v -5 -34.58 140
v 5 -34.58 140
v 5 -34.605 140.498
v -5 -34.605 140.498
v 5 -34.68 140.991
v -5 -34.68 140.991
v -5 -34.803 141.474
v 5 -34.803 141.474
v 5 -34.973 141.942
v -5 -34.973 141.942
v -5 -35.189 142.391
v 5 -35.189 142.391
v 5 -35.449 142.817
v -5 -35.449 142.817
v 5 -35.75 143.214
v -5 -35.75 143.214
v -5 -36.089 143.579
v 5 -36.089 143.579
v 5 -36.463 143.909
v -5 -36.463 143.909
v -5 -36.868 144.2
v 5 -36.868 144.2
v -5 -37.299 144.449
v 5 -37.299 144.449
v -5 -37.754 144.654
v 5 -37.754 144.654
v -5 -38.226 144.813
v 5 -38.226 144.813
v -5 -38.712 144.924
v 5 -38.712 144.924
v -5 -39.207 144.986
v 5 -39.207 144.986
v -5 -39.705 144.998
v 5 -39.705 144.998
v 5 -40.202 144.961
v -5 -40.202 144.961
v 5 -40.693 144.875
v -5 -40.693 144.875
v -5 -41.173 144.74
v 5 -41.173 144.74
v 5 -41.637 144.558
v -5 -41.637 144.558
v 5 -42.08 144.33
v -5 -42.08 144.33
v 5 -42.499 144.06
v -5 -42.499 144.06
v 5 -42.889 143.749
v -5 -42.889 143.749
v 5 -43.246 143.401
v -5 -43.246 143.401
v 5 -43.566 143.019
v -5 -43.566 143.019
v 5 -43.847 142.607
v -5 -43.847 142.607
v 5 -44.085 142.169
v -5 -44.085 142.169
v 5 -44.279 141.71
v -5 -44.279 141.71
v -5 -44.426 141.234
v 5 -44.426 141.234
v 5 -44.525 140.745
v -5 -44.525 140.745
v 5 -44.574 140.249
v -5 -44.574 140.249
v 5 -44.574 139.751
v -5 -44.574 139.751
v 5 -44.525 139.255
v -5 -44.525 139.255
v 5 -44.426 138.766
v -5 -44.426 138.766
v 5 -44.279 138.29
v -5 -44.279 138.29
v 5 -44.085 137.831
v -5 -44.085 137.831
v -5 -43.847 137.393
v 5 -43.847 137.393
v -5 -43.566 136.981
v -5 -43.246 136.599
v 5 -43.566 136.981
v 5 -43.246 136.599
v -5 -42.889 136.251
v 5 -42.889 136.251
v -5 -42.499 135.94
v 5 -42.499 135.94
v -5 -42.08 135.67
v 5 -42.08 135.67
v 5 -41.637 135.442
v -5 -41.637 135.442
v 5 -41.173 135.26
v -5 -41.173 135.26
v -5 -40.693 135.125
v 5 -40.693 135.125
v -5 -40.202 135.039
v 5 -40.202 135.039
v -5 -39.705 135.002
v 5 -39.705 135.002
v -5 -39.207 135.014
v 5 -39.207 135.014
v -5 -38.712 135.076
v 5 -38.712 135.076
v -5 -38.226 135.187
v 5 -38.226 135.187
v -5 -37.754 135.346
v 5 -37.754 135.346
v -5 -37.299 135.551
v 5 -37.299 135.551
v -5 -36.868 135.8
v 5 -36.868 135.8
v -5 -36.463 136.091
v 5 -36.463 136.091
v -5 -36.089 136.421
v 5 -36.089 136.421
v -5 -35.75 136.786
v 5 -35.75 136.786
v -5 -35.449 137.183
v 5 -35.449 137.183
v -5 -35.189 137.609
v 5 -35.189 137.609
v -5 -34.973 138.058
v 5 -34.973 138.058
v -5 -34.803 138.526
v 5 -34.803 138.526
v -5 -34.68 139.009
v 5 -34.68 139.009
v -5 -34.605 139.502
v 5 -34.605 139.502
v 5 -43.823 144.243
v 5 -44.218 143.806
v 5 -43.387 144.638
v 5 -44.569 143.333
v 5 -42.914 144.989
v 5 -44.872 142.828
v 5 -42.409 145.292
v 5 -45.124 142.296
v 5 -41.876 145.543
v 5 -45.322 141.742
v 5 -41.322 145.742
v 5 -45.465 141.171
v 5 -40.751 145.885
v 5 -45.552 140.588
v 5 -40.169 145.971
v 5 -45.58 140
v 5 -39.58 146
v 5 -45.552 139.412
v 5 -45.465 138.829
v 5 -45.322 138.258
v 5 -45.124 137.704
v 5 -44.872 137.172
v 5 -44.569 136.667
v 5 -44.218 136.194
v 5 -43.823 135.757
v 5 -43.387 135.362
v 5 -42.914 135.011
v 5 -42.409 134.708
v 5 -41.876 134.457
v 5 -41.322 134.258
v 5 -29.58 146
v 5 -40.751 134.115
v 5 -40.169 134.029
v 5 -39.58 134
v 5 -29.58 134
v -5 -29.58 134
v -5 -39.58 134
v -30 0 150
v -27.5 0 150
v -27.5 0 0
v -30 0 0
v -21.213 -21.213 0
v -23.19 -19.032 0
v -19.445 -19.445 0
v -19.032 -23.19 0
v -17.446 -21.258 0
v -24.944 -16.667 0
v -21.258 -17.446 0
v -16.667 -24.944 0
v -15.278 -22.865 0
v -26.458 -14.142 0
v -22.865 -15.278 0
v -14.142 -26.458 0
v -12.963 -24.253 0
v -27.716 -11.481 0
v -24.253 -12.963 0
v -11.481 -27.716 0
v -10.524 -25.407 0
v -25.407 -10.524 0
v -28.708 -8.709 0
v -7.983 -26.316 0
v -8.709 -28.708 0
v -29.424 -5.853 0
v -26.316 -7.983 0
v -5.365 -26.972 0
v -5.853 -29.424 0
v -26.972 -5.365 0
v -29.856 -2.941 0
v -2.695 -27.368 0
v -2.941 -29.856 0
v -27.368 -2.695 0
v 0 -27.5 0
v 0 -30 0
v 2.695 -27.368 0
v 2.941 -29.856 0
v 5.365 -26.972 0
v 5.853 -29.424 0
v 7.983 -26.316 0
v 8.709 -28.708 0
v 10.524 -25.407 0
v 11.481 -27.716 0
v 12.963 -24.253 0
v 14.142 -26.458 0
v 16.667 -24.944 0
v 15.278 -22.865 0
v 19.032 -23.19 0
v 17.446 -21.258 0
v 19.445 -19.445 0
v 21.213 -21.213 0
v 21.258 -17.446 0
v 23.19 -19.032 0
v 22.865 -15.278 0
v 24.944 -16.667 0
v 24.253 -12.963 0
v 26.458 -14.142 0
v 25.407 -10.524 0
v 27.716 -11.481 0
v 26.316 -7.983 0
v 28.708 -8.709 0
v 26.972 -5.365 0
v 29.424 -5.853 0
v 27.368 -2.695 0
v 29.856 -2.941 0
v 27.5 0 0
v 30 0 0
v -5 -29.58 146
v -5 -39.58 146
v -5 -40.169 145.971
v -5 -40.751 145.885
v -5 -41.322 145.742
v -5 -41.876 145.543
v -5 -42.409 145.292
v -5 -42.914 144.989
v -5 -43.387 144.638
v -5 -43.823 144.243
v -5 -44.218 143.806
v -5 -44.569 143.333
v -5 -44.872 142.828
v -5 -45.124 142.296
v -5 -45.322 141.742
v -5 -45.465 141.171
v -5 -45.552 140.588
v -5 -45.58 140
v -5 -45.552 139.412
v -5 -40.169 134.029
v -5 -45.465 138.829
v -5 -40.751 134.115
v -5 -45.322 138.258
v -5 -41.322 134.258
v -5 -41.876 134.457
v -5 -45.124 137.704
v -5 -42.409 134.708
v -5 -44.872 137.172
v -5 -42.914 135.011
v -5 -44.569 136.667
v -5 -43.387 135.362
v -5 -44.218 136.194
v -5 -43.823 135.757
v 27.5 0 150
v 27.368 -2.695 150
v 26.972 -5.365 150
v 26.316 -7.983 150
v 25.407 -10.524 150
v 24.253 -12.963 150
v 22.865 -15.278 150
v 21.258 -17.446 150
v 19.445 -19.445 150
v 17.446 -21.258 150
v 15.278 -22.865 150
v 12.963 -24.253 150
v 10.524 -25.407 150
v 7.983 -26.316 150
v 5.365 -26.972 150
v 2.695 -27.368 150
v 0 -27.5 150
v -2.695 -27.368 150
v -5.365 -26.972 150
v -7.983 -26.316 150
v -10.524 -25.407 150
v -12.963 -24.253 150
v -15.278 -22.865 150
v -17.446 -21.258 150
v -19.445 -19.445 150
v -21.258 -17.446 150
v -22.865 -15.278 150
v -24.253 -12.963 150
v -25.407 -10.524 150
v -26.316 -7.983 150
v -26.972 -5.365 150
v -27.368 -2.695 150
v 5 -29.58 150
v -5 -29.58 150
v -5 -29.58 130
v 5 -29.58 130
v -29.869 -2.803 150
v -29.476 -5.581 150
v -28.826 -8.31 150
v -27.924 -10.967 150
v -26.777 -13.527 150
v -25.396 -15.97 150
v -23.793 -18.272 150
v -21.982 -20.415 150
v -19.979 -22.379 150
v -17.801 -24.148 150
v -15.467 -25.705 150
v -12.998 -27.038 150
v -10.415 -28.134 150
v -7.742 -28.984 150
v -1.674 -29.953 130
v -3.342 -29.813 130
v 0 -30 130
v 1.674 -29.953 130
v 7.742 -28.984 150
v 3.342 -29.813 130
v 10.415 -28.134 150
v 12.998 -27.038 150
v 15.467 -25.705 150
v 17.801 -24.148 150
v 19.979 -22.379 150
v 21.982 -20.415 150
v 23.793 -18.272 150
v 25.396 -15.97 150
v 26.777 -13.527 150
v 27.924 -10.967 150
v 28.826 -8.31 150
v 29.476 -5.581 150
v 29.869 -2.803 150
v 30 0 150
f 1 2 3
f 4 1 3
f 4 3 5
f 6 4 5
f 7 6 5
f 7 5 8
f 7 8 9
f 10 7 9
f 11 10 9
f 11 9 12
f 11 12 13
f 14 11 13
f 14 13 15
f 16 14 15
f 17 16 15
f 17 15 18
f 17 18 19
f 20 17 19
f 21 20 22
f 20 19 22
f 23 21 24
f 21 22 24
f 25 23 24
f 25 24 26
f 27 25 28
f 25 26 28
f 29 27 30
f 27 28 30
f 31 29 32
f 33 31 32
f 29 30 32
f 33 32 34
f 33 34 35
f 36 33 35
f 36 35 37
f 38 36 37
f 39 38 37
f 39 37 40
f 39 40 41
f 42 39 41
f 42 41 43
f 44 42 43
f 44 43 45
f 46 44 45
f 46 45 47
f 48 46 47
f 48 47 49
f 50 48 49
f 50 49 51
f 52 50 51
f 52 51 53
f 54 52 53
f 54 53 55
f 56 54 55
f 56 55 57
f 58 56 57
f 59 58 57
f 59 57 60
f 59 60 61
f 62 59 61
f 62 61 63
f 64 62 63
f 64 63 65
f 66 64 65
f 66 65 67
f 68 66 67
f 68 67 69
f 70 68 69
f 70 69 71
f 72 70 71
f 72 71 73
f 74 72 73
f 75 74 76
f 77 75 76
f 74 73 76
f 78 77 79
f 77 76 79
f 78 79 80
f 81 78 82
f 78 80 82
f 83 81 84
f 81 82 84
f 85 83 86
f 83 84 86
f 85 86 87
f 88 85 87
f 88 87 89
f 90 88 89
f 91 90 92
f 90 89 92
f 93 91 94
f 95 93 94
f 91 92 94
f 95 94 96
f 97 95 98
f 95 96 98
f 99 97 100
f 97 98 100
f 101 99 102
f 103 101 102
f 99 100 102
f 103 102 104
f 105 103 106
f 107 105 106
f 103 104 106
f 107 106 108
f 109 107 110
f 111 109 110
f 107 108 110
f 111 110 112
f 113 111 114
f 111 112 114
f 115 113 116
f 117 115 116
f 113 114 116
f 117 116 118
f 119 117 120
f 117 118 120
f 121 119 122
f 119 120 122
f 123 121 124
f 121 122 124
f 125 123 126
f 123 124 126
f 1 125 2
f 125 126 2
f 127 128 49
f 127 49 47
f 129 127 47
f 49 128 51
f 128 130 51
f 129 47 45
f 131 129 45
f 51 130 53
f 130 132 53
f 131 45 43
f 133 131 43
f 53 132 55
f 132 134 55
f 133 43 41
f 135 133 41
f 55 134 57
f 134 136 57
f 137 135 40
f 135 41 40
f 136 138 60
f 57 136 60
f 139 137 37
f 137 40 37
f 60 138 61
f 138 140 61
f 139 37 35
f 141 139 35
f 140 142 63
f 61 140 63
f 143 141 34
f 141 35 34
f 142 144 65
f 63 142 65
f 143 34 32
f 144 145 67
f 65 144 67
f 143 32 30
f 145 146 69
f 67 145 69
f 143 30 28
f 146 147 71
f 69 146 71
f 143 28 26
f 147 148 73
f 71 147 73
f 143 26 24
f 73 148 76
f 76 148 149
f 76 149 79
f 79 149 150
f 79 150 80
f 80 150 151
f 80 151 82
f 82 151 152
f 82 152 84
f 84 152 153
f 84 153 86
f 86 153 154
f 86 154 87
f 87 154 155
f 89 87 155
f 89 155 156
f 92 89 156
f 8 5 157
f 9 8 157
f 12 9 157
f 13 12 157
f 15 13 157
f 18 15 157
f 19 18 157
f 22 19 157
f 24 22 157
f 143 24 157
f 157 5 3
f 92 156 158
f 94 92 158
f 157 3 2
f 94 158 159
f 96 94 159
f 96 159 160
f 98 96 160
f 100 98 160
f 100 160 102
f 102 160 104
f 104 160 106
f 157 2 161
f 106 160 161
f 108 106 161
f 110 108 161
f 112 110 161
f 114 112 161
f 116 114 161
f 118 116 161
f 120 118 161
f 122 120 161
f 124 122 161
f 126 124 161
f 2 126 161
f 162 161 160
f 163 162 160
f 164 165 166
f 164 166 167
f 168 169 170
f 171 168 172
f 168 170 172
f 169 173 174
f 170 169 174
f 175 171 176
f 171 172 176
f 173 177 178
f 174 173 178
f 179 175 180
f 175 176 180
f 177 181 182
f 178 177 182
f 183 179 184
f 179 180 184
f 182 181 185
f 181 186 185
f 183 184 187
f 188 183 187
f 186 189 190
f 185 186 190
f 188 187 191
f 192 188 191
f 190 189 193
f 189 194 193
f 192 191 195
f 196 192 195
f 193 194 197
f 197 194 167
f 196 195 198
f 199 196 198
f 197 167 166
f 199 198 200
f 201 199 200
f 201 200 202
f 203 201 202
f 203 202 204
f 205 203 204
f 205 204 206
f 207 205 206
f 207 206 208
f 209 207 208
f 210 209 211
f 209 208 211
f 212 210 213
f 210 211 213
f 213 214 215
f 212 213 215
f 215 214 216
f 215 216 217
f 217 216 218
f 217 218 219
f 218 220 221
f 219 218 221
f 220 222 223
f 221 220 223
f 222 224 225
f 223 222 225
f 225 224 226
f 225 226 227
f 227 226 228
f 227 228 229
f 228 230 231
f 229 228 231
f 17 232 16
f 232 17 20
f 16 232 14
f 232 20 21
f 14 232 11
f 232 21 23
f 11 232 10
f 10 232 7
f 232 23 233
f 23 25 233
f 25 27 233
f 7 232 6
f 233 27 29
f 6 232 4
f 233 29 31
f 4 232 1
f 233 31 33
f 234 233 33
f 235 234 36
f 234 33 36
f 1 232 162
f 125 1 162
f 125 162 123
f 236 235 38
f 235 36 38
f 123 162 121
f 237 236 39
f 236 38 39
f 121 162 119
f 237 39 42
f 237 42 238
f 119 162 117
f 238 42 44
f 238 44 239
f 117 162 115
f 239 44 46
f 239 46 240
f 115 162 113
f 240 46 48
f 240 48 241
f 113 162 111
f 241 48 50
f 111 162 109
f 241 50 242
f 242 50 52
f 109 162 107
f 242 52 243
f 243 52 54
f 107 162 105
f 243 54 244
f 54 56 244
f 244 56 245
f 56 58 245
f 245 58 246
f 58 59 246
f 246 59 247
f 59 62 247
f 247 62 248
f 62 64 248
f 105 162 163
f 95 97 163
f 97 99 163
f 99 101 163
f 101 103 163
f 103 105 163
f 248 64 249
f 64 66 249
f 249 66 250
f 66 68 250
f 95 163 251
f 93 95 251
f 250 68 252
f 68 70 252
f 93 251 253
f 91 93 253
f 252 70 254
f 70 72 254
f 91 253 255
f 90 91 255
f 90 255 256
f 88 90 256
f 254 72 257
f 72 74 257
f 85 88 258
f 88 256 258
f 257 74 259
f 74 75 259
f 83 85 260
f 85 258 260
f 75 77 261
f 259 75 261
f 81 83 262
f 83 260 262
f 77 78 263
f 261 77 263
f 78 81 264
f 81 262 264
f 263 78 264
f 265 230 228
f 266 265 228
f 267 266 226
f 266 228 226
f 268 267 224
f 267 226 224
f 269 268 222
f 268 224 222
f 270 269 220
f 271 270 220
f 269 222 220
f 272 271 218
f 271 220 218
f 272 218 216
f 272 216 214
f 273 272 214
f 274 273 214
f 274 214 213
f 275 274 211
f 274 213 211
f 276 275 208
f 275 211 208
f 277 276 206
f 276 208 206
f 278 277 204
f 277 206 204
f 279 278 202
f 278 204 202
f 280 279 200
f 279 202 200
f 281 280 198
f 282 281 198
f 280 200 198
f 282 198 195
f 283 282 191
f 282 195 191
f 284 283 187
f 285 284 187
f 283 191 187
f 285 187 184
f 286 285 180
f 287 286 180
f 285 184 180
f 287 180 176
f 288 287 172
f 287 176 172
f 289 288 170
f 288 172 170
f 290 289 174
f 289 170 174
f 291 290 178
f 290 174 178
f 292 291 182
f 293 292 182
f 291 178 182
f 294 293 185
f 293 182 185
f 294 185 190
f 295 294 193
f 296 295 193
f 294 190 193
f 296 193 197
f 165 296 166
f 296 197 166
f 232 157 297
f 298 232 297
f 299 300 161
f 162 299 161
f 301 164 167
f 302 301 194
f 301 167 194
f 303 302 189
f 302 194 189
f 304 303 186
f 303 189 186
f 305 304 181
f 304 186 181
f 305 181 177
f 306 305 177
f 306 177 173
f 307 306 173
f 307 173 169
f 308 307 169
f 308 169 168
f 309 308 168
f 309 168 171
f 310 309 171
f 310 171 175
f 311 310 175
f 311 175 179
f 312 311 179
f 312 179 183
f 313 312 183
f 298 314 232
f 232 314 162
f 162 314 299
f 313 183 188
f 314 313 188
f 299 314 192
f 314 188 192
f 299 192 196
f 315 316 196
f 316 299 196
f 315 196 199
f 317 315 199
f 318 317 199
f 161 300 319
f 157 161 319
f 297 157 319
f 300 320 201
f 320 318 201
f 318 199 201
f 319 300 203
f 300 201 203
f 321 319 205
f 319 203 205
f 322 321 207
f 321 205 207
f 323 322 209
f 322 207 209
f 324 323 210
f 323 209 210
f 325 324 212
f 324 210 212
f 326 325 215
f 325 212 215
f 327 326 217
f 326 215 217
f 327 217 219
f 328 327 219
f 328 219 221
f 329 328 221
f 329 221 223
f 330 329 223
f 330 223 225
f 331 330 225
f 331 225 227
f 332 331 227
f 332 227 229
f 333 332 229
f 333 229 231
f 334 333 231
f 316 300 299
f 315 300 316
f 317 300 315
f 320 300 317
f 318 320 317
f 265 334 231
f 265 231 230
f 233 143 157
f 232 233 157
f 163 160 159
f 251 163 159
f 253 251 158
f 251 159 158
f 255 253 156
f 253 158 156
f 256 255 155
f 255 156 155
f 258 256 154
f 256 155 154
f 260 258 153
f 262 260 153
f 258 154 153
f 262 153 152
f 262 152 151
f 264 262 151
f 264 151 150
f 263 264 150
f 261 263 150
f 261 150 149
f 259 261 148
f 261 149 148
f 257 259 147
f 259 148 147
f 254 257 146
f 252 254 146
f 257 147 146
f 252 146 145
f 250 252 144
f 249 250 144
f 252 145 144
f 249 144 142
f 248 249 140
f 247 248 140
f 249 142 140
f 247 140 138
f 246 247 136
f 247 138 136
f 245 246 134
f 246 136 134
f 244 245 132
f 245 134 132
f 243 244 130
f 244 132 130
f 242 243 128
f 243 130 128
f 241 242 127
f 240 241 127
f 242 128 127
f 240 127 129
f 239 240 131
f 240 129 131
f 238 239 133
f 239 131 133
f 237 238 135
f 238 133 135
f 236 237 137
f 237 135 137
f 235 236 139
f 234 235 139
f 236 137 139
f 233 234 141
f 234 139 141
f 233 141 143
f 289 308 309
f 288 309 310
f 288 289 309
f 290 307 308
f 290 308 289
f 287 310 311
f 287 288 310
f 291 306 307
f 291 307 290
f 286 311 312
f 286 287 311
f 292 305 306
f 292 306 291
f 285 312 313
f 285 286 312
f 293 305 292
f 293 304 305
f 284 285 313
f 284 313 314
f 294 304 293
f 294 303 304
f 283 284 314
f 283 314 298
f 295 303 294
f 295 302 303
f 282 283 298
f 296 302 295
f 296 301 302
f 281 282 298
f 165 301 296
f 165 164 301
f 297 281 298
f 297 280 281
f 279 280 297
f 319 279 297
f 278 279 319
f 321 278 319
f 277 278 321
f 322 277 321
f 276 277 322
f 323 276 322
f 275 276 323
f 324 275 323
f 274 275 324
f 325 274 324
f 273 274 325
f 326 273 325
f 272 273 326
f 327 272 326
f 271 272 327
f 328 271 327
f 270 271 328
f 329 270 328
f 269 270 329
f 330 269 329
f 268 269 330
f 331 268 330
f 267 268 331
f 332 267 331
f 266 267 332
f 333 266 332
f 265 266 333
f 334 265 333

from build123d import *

# Parameters (mm, degrees)
BOSS_EXTRUDE1_DEPTH = 150
BOSS_EXTRUDE2_START = -20
BOSS_EXTRUDE2_DEPTH = 20
SKETCH3_R           = 5
CUT_EXTRUDE1_DEPTH  = 20
CUT_EXTRUDE2_DEPTH  = 10


with BuildPart() as part:
    # Sketch1 → Boss-Extrude1 (new body)
    with BuildSketch(Plane.XY):
        with BuildLine():
            Line((30, 0), (27.5, 0))
            ThreePointArc((27.5, 0), (0, -27.5), (-27.5, 0))
            Line((-27.5, 0), (-30, 0))
            ThreePointArc((-30, 0), (0, -30), (30, 0))
        make_face()
    extrude(amount=BOSS_EXTRUDE1_DEPTH)

    # Sketch2 → Boss-Extrude2 (add)
    with BuildSketch(Plane.XY.offset(150).offset(BOSS_EXTRUDE2_START)):
        with BuildLine():
            Line((0, -45.496190277), (0, -30))
            ThreePointArc((0, -30), (-2.508787808, -29.894915684), (-5, -29.580398915))
            Line((-5, -29.580398915), (-5, -48))
            Line((-5, -48), (0, -48))
            Line((0, -48), (0, -45.496190277))
        make_face()
        with BuildLine():
            ThreePointArc((5, -29.580398915), (2.508787808, -29.894915684), (0, -30))
            Line((0, -30), (0, -45.496190277))
            Line((0, -45.496190277), (0, -48))
            Line((0, -48), (5, -48))
            Line((5, -48), (5, -29.580398915))
        make_face()
    extrude(amount=BOSS_EXTRUDE2_DEPTH)

    # Sketch3 → Cut-Extrude1 (cut)
    with BuildSketch(Plane(origin=(5, 0, 0), x_dir=(0, 0, -1), z_dir=(1, 0, 0))):
        with Locations(Location((-140, -39.580398915, 0), (0, 0, 90))):
            Circle(SKETCH3_R)
    extrude(amount=-CUT_EXTRUDE1_DEPTH, mode=Mode.SUBTRACT)

    # Sketch4 → Cut-Extrude2 (cut)
    with BuildSketch(Plane(origin=(5, 0, 0), x_dir=(0, 0, -1), z_dir=(1, 0, 0))):
        with BuildLine():
            ThreePointArc((-134, -39.580398915), (-140, -45.580398915), (-146, -39.580398915))
            Line((-146, -39.580398915), (-146, -29.580398915))
            Line((-146, -29.580398915), (-150, -29.580398915))
            Line((-150, -29.580398915), (-150, -48))
            Line((-150, -48), (-130, -48))
            Line((-130, -48), (-130, -29.580398915))
            Line((-130, -29.580398915), (-134, -29.580398915))
            Line((-134, -29.580398915), (-134, -39.580398915))
        make_face()
    extrude(amount=-CUT_EXTRUDE2_DEPTH, mode=Mode.SUBTRACT)


solid = part.part
